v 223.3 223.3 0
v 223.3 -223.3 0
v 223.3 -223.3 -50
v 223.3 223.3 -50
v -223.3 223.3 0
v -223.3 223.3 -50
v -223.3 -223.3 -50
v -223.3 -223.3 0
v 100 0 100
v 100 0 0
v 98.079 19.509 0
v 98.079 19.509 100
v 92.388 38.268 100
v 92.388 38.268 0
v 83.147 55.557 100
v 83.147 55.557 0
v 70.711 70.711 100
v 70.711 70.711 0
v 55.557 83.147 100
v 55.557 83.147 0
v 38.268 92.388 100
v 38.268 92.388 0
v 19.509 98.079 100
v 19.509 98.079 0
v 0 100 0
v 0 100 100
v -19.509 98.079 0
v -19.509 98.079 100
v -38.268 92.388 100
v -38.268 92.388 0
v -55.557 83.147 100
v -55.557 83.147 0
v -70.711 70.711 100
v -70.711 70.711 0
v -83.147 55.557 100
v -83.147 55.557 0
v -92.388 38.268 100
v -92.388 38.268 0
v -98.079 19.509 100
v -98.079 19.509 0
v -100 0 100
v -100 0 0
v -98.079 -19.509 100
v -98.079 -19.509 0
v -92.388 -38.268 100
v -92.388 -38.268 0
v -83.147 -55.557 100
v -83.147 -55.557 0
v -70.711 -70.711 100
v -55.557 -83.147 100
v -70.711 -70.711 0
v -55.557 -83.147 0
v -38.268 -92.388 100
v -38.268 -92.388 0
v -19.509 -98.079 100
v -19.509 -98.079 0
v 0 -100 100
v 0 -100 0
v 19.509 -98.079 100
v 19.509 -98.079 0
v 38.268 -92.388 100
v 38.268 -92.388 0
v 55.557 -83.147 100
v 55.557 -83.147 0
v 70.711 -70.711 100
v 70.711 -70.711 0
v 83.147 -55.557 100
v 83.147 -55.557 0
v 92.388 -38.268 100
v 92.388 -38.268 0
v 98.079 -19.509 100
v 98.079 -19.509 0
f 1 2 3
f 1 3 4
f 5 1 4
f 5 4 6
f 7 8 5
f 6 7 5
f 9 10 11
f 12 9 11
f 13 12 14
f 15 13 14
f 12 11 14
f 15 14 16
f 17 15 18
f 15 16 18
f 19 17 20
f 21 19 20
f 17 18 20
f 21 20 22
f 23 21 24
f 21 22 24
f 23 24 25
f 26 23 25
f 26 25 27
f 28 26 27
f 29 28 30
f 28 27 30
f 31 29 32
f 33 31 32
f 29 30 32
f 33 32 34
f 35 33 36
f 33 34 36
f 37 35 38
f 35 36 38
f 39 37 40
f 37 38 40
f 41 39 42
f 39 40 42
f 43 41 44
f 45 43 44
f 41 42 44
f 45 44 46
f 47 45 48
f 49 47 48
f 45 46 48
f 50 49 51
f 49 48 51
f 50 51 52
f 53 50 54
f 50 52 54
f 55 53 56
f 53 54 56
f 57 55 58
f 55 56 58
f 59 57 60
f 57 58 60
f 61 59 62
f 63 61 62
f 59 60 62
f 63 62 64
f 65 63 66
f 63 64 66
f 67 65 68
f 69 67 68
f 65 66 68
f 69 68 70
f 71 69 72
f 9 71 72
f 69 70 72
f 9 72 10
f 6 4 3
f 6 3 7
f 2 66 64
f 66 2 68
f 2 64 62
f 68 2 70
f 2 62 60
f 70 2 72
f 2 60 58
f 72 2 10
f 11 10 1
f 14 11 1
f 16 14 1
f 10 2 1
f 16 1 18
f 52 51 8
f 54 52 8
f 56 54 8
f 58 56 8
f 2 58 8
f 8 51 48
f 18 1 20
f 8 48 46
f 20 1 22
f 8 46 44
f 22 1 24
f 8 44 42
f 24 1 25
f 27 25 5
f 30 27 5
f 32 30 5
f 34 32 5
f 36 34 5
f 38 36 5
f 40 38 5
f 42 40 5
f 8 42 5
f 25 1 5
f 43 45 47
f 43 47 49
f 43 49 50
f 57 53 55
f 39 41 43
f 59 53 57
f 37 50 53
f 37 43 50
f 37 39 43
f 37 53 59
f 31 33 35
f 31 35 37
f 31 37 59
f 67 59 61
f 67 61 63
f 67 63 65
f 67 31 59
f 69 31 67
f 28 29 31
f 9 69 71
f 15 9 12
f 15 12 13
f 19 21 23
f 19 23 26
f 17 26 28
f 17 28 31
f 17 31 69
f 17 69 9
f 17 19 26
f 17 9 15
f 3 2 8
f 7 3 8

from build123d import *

# Parameters (mm, degrees)
SKETCH1_R           = 100
BOSS_EXTRUDE1_DEPTH = 100
SKETCH2_W           = 446.6
SKETCH2_H           = 446.6
BOSS_EXTRUDE2_DEPTH = 50


with BuildPart() as part:
    # Sketch1 → Boss-Extrude1 (new body)
    with BuildSketch(Plane.XY):
        Circle(SKETCH1_R)
    extrude(amount=BOSS_EXTRUDE1_DEPTH)

    # Sketch2 → Boss-Extrude2 (add)
    with BuildSketch(Plane(origin=(0, 0, 0), x_dir=(-1, 0, 0), z_dir=(0, 0, -1))):
        Rectangle(SKETCH2_W, SKETCH2_H)
    extrude(amount=BOSS_EXTRUDE2_DEPTH)


solid = part.part
